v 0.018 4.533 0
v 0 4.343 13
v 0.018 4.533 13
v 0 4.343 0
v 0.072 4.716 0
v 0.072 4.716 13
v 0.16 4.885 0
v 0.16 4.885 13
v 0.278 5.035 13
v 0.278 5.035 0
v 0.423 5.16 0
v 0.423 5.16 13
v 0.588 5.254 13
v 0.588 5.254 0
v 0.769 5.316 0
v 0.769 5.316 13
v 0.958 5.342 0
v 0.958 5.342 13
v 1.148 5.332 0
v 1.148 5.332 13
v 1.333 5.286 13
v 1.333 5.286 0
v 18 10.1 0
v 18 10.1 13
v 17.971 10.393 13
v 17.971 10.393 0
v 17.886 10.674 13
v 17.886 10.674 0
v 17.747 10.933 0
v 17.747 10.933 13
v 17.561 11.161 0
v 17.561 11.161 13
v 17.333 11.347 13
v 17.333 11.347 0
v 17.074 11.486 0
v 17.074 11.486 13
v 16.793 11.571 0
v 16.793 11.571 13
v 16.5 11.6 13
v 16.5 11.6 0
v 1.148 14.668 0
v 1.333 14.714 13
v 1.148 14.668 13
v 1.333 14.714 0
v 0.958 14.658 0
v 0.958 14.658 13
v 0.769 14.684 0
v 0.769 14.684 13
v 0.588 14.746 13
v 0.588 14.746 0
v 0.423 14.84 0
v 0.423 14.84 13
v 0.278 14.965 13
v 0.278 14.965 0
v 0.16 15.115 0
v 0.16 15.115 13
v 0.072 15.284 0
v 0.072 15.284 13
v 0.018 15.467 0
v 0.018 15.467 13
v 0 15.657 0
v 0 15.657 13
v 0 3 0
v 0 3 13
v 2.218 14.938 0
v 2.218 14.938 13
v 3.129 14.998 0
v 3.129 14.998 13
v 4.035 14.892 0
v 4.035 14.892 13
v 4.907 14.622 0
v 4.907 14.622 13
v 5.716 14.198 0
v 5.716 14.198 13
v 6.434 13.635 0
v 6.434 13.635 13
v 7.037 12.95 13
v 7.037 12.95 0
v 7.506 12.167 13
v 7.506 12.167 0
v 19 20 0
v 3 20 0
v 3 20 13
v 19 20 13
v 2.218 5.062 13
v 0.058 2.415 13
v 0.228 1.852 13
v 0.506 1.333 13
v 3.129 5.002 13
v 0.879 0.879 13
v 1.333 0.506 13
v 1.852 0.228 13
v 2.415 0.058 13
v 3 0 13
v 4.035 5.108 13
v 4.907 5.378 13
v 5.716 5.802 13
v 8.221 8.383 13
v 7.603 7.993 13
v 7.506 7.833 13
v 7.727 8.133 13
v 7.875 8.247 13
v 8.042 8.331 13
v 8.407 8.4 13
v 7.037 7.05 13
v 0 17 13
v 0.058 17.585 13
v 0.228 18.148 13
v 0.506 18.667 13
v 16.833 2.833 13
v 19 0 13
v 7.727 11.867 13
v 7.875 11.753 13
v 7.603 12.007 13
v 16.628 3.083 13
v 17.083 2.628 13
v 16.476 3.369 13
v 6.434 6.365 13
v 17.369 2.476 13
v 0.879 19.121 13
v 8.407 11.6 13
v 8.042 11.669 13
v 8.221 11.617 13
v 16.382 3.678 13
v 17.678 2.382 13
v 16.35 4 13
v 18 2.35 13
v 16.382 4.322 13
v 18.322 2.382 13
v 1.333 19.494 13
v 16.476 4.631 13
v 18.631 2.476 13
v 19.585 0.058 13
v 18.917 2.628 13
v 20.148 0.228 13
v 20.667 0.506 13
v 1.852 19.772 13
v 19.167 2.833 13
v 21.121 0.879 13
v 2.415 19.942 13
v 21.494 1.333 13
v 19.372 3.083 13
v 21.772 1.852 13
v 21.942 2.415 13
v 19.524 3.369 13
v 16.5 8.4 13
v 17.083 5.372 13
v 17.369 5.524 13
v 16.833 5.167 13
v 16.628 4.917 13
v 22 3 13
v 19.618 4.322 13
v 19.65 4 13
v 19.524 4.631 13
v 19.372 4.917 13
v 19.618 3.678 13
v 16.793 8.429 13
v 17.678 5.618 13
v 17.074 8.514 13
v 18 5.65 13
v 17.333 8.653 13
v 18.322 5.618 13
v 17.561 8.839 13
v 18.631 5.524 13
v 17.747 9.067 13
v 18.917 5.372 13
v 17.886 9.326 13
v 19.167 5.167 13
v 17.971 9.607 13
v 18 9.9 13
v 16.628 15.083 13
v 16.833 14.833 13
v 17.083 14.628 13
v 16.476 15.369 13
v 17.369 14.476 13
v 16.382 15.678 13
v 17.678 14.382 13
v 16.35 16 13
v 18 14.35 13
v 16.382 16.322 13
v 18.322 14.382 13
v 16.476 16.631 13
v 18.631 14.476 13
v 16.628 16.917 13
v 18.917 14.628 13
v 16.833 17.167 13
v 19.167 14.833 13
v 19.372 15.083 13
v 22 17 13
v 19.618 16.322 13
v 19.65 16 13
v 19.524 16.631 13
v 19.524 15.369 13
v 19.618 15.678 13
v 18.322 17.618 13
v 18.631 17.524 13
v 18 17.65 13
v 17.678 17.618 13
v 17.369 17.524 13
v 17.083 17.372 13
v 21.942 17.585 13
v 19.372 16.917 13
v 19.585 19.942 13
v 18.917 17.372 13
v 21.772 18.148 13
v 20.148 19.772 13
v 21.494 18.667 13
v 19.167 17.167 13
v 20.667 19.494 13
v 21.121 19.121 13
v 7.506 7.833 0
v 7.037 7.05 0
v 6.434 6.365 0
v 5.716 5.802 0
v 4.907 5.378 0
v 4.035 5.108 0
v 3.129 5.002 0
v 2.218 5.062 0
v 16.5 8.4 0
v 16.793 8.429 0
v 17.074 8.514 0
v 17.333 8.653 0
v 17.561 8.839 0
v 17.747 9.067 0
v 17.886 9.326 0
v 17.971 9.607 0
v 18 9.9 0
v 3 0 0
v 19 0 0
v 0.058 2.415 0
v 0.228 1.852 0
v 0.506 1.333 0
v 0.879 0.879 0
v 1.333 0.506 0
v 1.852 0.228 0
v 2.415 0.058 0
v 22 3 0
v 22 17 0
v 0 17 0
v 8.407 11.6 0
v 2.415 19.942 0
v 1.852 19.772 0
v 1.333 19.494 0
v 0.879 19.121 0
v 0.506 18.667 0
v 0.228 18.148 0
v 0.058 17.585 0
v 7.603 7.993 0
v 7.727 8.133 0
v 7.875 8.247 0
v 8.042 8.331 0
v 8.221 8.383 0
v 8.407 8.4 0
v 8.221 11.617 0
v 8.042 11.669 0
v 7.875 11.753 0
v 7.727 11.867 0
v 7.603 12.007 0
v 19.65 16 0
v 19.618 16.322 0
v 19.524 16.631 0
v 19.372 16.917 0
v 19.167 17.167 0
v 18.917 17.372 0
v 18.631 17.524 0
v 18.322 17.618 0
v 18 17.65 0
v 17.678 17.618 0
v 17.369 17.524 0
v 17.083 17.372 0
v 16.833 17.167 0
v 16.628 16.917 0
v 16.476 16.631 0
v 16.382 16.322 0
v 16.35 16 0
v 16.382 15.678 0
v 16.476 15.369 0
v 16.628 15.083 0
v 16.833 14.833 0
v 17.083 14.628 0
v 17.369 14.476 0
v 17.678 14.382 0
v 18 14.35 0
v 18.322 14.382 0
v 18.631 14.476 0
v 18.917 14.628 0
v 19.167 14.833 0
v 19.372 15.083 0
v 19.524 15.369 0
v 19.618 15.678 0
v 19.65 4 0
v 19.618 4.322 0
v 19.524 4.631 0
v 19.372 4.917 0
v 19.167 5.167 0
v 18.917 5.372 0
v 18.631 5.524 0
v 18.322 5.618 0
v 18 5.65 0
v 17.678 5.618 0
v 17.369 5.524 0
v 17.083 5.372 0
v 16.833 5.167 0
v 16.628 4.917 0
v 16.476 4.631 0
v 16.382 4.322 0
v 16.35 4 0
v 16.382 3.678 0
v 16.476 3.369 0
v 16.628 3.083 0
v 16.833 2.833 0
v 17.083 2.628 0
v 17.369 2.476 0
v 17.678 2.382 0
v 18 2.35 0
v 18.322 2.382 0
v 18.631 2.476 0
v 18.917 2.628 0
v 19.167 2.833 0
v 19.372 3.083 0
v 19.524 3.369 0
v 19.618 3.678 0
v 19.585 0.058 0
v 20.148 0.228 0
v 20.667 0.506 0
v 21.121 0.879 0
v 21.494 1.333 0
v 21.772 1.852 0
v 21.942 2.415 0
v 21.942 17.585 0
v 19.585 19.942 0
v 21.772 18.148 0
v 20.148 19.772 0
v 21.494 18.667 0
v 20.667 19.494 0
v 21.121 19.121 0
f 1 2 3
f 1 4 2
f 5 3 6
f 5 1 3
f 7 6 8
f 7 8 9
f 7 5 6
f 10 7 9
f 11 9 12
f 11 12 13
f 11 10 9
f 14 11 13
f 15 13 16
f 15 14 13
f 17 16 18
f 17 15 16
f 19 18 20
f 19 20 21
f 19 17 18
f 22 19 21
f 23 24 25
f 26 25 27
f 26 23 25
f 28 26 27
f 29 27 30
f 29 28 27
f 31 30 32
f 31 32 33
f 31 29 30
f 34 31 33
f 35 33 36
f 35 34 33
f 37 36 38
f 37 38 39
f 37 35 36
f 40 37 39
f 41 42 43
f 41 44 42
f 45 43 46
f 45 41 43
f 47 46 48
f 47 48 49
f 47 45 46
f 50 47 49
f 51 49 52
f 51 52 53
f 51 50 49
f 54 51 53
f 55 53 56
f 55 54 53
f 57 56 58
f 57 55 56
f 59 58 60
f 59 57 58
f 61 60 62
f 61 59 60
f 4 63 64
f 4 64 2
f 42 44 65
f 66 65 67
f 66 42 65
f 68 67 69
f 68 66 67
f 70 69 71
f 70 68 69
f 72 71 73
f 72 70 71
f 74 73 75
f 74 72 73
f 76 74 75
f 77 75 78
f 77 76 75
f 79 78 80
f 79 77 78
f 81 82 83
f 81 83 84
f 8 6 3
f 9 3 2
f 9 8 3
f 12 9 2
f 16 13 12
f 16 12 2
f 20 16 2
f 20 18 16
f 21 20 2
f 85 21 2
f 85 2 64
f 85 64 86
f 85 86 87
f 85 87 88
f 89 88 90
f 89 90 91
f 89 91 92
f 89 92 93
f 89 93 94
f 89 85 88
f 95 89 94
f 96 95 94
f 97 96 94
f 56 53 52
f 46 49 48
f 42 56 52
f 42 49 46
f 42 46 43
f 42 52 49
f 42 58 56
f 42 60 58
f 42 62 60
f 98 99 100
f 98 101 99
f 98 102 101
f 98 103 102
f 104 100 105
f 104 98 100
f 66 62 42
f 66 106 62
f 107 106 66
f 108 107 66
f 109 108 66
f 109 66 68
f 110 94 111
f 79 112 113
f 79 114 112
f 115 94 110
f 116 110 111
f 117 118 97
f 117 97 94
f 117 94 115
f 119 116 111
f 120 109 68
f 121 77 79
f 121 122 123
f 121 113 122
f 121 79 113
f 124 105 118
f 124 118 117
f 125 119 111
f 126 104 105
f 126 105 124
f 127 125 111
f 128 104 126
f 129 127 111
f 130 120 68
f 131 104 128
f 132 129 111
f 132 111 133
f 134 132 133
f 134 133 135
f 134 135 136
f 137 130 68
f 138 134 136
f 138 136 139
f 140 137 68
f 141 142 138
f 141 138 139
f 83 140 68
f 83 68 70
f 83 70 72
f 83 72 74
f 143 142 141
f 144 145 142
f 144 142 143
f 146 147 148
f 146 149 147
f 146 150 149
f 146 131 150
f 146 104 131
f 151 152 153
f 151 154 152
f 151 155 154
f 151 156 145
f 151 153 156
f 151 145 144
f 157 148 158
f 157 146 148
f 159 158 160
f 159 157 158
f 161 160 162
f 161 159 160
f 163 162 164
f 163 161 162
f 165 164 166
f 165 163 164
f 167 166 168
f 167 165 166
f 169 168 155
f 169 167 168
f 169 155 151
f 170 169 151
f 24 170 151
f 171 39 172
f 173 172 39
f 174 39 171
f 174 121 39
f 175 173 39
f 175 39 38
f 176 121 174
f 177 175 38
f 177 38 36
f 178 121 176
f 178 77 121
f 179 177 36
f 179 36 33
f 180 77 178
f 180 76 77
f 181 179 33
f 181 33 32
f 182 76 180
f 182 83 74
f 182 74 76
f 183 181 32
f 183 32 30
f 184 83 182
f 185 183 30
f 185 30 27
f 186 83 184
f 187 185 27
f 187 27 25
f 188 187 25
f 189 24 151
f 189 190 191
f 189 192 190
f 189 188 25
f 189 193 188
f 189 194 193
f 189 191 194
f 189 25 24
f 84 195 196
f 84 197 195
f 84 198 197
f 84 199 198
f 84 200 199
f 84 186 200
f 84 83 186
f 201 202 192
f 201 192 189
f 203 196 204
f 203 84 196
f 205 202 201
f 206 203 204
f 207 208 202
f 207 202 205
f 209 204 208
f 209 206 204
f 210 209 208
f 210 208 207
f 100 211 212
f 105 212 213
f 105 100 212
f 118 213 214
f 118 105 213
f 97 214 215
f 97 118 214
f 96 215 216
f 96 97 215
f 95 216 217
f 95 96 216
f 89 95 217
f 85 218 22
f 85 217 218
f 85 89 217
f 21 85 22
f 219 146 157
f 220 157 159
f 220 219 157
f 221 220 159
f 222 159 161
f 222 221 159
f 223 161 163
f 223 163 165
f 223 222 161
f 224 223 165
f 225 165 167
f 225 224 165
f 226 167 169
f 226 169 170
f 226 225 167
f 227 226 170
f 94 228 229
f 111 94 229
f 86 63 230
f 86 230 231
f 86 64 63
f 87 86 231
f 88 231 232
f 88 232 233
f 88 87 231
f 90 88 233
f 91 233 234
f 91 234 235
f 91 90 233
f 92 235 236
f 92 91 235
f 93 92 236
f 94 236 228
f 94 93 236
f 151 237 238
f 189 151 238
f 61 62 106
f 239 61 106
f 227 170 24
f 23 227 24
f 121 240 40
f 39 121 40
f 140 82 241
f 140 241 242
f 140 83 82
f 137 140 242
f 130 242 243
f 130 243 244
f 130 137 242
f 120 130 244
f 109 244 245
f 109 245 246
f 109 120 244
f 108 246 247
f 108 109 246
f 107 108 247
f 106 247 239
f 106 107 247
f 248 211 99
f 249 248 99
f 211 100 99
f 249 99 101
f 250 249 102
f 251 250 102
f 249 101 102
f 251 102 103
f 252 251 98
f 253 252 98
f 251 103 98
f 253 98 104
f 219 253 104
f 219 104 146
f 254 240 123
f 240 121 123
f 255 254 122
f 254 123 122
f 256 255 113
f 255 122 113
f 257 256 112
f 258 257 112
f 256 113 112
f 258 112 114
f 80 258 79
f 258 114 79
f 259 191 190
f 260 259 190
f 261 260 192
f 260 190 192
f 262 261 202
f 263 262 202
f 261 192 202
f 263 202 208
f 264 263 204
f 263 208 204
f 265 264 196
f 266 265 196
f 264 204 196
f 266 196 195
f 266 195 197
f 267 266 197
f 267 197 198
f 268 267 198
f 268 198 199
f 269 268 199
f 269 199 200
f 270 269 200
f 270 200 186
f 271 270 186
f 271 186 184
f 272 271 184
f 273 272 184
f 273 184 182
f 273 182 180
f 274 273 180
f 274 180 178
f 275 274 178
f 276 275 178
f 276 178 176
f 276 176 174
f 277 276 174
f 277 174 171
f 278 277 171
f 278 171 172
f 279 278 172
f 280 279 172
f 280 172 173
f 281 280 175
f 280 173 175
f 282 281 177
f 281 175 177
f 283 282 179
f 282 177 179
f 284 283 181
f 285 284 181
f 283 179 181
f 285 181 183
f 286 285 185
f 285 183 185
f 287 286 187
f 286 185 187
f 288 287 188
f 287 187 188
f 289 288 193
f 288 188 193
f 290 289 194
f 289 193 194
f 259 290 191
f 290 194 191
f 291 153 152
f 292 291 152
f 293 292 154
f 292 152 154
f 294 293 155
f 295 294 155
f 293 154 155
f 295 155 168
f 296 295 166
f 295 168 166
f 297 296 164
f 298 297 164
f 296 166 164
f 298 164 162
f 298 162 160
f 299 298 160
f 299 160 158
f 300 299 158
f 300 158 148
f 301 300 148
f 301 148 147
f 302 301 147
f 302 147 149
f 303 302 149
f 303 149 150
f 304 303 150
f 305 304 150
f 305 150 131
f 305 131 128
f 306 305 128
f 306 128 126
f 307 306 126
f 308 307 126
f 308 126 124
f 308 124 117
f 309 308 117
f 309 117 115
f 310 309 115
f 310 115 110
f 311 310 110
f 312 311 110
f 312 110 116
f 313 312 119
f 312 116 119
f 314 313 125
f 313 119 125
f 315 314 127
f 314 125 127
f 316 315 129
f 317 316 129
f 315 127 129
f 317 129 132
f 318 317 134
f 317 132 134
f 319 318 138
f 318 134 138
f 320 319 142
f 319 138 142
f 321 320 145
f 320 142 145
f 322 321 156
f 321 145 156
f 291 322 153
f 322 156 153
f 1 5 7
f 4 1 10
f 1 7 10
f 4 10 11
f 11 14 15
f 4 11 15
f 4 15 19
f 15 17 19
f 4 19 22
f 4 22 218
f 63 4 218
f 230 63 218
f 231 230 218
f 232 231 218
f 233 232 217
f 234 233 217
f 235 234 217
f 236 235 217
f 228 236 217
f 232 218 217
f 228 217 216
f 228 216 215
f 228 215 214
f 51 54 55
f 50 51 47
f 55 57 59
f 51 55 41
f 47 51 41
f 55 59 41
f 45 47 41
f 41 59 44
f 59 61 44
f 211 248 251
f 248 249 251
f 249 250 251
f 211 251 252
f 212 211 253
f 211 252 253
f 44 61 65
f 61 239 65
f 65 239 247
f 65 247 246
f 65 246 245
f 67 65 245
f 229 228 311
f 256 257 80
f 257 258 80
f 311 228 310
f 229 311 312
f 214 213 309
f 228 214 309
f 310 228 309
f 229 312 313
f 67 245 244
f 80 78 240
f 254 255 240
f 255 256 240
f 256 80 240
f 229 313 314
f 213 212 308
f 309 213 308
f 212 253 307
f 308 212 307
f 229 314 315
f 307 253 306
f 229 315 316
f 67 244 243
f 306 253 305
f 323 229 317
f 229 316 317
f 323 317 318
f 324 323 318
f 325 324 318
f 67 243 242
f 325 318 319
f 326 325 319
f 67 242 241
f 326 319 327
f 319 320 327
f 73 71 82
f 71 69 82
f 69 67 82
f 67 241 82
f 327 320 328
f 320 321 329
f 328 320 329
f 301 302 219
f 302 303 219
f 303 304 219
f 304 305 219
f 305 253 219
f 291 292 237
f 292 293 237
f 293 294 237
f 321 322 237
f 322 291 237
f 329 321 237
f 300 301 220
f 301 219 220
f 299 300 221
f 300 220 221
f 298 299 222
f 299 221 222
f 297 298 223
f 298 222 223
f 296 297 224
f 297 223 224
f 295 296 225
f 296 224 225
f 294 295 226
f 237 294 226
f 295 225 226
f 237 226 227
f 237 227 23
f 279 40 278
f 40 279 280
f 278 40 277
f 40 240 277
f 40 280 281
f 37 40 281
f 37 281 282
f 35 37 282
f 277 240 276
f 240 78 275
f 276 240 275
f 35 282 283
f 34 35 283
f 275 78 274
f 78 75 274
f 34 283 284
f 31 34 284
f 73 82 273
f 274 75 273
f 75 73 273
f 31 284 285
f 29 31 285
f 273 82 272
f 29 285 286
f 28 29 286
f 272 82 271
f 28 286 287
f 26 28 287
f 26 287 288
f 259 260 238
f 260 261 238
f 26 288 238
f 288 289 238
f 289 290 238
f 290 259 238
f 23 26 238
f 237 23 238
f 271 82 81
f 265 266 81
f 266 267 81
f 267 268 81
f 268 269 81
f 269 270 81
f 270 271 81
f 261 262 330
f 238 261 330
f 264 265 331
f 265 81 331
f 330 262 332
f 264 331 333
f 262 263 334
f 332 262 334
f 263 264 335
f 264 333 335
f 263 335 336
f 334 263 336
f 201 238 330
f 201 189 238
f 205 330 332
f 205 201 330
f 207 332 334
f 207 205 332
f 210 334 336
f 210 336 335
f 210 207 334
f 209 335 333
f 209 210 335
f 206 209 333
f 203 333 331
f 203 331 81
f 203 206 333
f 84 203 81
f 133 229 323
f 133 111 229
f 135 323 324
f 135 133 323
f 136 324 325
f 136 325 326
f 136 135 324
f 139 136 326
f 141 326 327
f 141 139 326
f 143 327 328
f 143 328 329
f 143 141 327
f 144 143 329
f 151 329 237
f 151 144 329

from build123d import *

# Parameters (mm, degrees)
ESQUISSE1_W                  = 22
ESQUISSE1_H                  = 20
BOSS_EXTRU_1_DEPTH           = 13
ESQUISSE2_R                  = 1.65
ENL_V_MAT_EXTRU_1_DEPTH      = 1
ENL_V_MAT_EXTRU_1_DEPTH_BACK = 14
ESQUISSE4_W                  = 12
ESQUISSE4_H                  = 3.2
ENL_V_MAT_EXTRU_2_DEPTH      = 13
CONG_1_R                     = 1
CONG_2_R                     = 3
CONG_3_R                     = 1.5


with BuildPart() as part:
    # Esquisse1 → Boss.-Extru.1 (new body)
    with BuildSketch(Plane.XY):
        with Locations((11, 10)):
            Rectangle(ESQUISSE1_W, ESQUISSE1_H)
    extrude(amount=BOSS_EXTRU_1_DEPTH)

    # Esquisse2 → Enlèv. mat.-Extru.1 (cut, two sides)
    with BuildSketch(Plane.XY.offset(13)) as enl_v_mat_extru_1_sk:
        with Locations((18, 16)):
            Circle(ESQUISSE2_R)
        with Locations((18, 4)):
            Circle(ESQUISSE2_R)
        with BuildLine():
            Line((0, 6), (0, 14))
            ThreePointArc((0, 14), (8, 10), (0, 6))
        make_face()
    extrude(amount=ENL_V_MAT_EXTRU_1_DEPTH, mode=Mode.SUBTRACT)
    extrude(enl_v_mat_extru_1_sk.sketch, amount=-ENL_V_MAT_EXTRU_1_DEPTH_BACK, mode=Mode.SUBTRACT)

    # Esquisse4 → Enlèv. mat.-Extru.2 (cut)
    with BuildSketch(Plane.XY.offset(13)):
        with Locations((12, 10)):
            Rectangle(ESQUISSE4_W, ESQUISSE4_H)
    extrude(amount=-ENL_V_MAT_EXTRU_2_DEPTH, mode=Mode.SUBTRACT)

    # Congé1
    cong_1_edges = [part.edges().sort_by_distance(p)[0] for p in [
        (0, 14, 6.5),
        (0, 6, 6.5),
        (7.737087713, 11.6, 6.5),
        (7.737087713, 8.4, 6.5),
    ]]
    fillet(cong_1_edges, radius=CONG_1_R)

    # Congé2
    cong_2_edges = [part.edges().sort_by_distance(p)[0] for p in [
        (0, 20, 6.5),
        (22, 20, 6.5),
        (22, 0, 6.5),
        (0, 0, 6.5),
    ]]
    fillet(cong_2_edges, radius=CONG_2_R)

    # Congé3
    cong_3_edges = [part.edges().sort_by_distance(p)[0] for p in [
        (18, 8.4, 6.5),
        (18, 11.6, 6.5),
    ]]
    fillet(cong_3_edges, radius=CONG_3_R)


solid = part.part
